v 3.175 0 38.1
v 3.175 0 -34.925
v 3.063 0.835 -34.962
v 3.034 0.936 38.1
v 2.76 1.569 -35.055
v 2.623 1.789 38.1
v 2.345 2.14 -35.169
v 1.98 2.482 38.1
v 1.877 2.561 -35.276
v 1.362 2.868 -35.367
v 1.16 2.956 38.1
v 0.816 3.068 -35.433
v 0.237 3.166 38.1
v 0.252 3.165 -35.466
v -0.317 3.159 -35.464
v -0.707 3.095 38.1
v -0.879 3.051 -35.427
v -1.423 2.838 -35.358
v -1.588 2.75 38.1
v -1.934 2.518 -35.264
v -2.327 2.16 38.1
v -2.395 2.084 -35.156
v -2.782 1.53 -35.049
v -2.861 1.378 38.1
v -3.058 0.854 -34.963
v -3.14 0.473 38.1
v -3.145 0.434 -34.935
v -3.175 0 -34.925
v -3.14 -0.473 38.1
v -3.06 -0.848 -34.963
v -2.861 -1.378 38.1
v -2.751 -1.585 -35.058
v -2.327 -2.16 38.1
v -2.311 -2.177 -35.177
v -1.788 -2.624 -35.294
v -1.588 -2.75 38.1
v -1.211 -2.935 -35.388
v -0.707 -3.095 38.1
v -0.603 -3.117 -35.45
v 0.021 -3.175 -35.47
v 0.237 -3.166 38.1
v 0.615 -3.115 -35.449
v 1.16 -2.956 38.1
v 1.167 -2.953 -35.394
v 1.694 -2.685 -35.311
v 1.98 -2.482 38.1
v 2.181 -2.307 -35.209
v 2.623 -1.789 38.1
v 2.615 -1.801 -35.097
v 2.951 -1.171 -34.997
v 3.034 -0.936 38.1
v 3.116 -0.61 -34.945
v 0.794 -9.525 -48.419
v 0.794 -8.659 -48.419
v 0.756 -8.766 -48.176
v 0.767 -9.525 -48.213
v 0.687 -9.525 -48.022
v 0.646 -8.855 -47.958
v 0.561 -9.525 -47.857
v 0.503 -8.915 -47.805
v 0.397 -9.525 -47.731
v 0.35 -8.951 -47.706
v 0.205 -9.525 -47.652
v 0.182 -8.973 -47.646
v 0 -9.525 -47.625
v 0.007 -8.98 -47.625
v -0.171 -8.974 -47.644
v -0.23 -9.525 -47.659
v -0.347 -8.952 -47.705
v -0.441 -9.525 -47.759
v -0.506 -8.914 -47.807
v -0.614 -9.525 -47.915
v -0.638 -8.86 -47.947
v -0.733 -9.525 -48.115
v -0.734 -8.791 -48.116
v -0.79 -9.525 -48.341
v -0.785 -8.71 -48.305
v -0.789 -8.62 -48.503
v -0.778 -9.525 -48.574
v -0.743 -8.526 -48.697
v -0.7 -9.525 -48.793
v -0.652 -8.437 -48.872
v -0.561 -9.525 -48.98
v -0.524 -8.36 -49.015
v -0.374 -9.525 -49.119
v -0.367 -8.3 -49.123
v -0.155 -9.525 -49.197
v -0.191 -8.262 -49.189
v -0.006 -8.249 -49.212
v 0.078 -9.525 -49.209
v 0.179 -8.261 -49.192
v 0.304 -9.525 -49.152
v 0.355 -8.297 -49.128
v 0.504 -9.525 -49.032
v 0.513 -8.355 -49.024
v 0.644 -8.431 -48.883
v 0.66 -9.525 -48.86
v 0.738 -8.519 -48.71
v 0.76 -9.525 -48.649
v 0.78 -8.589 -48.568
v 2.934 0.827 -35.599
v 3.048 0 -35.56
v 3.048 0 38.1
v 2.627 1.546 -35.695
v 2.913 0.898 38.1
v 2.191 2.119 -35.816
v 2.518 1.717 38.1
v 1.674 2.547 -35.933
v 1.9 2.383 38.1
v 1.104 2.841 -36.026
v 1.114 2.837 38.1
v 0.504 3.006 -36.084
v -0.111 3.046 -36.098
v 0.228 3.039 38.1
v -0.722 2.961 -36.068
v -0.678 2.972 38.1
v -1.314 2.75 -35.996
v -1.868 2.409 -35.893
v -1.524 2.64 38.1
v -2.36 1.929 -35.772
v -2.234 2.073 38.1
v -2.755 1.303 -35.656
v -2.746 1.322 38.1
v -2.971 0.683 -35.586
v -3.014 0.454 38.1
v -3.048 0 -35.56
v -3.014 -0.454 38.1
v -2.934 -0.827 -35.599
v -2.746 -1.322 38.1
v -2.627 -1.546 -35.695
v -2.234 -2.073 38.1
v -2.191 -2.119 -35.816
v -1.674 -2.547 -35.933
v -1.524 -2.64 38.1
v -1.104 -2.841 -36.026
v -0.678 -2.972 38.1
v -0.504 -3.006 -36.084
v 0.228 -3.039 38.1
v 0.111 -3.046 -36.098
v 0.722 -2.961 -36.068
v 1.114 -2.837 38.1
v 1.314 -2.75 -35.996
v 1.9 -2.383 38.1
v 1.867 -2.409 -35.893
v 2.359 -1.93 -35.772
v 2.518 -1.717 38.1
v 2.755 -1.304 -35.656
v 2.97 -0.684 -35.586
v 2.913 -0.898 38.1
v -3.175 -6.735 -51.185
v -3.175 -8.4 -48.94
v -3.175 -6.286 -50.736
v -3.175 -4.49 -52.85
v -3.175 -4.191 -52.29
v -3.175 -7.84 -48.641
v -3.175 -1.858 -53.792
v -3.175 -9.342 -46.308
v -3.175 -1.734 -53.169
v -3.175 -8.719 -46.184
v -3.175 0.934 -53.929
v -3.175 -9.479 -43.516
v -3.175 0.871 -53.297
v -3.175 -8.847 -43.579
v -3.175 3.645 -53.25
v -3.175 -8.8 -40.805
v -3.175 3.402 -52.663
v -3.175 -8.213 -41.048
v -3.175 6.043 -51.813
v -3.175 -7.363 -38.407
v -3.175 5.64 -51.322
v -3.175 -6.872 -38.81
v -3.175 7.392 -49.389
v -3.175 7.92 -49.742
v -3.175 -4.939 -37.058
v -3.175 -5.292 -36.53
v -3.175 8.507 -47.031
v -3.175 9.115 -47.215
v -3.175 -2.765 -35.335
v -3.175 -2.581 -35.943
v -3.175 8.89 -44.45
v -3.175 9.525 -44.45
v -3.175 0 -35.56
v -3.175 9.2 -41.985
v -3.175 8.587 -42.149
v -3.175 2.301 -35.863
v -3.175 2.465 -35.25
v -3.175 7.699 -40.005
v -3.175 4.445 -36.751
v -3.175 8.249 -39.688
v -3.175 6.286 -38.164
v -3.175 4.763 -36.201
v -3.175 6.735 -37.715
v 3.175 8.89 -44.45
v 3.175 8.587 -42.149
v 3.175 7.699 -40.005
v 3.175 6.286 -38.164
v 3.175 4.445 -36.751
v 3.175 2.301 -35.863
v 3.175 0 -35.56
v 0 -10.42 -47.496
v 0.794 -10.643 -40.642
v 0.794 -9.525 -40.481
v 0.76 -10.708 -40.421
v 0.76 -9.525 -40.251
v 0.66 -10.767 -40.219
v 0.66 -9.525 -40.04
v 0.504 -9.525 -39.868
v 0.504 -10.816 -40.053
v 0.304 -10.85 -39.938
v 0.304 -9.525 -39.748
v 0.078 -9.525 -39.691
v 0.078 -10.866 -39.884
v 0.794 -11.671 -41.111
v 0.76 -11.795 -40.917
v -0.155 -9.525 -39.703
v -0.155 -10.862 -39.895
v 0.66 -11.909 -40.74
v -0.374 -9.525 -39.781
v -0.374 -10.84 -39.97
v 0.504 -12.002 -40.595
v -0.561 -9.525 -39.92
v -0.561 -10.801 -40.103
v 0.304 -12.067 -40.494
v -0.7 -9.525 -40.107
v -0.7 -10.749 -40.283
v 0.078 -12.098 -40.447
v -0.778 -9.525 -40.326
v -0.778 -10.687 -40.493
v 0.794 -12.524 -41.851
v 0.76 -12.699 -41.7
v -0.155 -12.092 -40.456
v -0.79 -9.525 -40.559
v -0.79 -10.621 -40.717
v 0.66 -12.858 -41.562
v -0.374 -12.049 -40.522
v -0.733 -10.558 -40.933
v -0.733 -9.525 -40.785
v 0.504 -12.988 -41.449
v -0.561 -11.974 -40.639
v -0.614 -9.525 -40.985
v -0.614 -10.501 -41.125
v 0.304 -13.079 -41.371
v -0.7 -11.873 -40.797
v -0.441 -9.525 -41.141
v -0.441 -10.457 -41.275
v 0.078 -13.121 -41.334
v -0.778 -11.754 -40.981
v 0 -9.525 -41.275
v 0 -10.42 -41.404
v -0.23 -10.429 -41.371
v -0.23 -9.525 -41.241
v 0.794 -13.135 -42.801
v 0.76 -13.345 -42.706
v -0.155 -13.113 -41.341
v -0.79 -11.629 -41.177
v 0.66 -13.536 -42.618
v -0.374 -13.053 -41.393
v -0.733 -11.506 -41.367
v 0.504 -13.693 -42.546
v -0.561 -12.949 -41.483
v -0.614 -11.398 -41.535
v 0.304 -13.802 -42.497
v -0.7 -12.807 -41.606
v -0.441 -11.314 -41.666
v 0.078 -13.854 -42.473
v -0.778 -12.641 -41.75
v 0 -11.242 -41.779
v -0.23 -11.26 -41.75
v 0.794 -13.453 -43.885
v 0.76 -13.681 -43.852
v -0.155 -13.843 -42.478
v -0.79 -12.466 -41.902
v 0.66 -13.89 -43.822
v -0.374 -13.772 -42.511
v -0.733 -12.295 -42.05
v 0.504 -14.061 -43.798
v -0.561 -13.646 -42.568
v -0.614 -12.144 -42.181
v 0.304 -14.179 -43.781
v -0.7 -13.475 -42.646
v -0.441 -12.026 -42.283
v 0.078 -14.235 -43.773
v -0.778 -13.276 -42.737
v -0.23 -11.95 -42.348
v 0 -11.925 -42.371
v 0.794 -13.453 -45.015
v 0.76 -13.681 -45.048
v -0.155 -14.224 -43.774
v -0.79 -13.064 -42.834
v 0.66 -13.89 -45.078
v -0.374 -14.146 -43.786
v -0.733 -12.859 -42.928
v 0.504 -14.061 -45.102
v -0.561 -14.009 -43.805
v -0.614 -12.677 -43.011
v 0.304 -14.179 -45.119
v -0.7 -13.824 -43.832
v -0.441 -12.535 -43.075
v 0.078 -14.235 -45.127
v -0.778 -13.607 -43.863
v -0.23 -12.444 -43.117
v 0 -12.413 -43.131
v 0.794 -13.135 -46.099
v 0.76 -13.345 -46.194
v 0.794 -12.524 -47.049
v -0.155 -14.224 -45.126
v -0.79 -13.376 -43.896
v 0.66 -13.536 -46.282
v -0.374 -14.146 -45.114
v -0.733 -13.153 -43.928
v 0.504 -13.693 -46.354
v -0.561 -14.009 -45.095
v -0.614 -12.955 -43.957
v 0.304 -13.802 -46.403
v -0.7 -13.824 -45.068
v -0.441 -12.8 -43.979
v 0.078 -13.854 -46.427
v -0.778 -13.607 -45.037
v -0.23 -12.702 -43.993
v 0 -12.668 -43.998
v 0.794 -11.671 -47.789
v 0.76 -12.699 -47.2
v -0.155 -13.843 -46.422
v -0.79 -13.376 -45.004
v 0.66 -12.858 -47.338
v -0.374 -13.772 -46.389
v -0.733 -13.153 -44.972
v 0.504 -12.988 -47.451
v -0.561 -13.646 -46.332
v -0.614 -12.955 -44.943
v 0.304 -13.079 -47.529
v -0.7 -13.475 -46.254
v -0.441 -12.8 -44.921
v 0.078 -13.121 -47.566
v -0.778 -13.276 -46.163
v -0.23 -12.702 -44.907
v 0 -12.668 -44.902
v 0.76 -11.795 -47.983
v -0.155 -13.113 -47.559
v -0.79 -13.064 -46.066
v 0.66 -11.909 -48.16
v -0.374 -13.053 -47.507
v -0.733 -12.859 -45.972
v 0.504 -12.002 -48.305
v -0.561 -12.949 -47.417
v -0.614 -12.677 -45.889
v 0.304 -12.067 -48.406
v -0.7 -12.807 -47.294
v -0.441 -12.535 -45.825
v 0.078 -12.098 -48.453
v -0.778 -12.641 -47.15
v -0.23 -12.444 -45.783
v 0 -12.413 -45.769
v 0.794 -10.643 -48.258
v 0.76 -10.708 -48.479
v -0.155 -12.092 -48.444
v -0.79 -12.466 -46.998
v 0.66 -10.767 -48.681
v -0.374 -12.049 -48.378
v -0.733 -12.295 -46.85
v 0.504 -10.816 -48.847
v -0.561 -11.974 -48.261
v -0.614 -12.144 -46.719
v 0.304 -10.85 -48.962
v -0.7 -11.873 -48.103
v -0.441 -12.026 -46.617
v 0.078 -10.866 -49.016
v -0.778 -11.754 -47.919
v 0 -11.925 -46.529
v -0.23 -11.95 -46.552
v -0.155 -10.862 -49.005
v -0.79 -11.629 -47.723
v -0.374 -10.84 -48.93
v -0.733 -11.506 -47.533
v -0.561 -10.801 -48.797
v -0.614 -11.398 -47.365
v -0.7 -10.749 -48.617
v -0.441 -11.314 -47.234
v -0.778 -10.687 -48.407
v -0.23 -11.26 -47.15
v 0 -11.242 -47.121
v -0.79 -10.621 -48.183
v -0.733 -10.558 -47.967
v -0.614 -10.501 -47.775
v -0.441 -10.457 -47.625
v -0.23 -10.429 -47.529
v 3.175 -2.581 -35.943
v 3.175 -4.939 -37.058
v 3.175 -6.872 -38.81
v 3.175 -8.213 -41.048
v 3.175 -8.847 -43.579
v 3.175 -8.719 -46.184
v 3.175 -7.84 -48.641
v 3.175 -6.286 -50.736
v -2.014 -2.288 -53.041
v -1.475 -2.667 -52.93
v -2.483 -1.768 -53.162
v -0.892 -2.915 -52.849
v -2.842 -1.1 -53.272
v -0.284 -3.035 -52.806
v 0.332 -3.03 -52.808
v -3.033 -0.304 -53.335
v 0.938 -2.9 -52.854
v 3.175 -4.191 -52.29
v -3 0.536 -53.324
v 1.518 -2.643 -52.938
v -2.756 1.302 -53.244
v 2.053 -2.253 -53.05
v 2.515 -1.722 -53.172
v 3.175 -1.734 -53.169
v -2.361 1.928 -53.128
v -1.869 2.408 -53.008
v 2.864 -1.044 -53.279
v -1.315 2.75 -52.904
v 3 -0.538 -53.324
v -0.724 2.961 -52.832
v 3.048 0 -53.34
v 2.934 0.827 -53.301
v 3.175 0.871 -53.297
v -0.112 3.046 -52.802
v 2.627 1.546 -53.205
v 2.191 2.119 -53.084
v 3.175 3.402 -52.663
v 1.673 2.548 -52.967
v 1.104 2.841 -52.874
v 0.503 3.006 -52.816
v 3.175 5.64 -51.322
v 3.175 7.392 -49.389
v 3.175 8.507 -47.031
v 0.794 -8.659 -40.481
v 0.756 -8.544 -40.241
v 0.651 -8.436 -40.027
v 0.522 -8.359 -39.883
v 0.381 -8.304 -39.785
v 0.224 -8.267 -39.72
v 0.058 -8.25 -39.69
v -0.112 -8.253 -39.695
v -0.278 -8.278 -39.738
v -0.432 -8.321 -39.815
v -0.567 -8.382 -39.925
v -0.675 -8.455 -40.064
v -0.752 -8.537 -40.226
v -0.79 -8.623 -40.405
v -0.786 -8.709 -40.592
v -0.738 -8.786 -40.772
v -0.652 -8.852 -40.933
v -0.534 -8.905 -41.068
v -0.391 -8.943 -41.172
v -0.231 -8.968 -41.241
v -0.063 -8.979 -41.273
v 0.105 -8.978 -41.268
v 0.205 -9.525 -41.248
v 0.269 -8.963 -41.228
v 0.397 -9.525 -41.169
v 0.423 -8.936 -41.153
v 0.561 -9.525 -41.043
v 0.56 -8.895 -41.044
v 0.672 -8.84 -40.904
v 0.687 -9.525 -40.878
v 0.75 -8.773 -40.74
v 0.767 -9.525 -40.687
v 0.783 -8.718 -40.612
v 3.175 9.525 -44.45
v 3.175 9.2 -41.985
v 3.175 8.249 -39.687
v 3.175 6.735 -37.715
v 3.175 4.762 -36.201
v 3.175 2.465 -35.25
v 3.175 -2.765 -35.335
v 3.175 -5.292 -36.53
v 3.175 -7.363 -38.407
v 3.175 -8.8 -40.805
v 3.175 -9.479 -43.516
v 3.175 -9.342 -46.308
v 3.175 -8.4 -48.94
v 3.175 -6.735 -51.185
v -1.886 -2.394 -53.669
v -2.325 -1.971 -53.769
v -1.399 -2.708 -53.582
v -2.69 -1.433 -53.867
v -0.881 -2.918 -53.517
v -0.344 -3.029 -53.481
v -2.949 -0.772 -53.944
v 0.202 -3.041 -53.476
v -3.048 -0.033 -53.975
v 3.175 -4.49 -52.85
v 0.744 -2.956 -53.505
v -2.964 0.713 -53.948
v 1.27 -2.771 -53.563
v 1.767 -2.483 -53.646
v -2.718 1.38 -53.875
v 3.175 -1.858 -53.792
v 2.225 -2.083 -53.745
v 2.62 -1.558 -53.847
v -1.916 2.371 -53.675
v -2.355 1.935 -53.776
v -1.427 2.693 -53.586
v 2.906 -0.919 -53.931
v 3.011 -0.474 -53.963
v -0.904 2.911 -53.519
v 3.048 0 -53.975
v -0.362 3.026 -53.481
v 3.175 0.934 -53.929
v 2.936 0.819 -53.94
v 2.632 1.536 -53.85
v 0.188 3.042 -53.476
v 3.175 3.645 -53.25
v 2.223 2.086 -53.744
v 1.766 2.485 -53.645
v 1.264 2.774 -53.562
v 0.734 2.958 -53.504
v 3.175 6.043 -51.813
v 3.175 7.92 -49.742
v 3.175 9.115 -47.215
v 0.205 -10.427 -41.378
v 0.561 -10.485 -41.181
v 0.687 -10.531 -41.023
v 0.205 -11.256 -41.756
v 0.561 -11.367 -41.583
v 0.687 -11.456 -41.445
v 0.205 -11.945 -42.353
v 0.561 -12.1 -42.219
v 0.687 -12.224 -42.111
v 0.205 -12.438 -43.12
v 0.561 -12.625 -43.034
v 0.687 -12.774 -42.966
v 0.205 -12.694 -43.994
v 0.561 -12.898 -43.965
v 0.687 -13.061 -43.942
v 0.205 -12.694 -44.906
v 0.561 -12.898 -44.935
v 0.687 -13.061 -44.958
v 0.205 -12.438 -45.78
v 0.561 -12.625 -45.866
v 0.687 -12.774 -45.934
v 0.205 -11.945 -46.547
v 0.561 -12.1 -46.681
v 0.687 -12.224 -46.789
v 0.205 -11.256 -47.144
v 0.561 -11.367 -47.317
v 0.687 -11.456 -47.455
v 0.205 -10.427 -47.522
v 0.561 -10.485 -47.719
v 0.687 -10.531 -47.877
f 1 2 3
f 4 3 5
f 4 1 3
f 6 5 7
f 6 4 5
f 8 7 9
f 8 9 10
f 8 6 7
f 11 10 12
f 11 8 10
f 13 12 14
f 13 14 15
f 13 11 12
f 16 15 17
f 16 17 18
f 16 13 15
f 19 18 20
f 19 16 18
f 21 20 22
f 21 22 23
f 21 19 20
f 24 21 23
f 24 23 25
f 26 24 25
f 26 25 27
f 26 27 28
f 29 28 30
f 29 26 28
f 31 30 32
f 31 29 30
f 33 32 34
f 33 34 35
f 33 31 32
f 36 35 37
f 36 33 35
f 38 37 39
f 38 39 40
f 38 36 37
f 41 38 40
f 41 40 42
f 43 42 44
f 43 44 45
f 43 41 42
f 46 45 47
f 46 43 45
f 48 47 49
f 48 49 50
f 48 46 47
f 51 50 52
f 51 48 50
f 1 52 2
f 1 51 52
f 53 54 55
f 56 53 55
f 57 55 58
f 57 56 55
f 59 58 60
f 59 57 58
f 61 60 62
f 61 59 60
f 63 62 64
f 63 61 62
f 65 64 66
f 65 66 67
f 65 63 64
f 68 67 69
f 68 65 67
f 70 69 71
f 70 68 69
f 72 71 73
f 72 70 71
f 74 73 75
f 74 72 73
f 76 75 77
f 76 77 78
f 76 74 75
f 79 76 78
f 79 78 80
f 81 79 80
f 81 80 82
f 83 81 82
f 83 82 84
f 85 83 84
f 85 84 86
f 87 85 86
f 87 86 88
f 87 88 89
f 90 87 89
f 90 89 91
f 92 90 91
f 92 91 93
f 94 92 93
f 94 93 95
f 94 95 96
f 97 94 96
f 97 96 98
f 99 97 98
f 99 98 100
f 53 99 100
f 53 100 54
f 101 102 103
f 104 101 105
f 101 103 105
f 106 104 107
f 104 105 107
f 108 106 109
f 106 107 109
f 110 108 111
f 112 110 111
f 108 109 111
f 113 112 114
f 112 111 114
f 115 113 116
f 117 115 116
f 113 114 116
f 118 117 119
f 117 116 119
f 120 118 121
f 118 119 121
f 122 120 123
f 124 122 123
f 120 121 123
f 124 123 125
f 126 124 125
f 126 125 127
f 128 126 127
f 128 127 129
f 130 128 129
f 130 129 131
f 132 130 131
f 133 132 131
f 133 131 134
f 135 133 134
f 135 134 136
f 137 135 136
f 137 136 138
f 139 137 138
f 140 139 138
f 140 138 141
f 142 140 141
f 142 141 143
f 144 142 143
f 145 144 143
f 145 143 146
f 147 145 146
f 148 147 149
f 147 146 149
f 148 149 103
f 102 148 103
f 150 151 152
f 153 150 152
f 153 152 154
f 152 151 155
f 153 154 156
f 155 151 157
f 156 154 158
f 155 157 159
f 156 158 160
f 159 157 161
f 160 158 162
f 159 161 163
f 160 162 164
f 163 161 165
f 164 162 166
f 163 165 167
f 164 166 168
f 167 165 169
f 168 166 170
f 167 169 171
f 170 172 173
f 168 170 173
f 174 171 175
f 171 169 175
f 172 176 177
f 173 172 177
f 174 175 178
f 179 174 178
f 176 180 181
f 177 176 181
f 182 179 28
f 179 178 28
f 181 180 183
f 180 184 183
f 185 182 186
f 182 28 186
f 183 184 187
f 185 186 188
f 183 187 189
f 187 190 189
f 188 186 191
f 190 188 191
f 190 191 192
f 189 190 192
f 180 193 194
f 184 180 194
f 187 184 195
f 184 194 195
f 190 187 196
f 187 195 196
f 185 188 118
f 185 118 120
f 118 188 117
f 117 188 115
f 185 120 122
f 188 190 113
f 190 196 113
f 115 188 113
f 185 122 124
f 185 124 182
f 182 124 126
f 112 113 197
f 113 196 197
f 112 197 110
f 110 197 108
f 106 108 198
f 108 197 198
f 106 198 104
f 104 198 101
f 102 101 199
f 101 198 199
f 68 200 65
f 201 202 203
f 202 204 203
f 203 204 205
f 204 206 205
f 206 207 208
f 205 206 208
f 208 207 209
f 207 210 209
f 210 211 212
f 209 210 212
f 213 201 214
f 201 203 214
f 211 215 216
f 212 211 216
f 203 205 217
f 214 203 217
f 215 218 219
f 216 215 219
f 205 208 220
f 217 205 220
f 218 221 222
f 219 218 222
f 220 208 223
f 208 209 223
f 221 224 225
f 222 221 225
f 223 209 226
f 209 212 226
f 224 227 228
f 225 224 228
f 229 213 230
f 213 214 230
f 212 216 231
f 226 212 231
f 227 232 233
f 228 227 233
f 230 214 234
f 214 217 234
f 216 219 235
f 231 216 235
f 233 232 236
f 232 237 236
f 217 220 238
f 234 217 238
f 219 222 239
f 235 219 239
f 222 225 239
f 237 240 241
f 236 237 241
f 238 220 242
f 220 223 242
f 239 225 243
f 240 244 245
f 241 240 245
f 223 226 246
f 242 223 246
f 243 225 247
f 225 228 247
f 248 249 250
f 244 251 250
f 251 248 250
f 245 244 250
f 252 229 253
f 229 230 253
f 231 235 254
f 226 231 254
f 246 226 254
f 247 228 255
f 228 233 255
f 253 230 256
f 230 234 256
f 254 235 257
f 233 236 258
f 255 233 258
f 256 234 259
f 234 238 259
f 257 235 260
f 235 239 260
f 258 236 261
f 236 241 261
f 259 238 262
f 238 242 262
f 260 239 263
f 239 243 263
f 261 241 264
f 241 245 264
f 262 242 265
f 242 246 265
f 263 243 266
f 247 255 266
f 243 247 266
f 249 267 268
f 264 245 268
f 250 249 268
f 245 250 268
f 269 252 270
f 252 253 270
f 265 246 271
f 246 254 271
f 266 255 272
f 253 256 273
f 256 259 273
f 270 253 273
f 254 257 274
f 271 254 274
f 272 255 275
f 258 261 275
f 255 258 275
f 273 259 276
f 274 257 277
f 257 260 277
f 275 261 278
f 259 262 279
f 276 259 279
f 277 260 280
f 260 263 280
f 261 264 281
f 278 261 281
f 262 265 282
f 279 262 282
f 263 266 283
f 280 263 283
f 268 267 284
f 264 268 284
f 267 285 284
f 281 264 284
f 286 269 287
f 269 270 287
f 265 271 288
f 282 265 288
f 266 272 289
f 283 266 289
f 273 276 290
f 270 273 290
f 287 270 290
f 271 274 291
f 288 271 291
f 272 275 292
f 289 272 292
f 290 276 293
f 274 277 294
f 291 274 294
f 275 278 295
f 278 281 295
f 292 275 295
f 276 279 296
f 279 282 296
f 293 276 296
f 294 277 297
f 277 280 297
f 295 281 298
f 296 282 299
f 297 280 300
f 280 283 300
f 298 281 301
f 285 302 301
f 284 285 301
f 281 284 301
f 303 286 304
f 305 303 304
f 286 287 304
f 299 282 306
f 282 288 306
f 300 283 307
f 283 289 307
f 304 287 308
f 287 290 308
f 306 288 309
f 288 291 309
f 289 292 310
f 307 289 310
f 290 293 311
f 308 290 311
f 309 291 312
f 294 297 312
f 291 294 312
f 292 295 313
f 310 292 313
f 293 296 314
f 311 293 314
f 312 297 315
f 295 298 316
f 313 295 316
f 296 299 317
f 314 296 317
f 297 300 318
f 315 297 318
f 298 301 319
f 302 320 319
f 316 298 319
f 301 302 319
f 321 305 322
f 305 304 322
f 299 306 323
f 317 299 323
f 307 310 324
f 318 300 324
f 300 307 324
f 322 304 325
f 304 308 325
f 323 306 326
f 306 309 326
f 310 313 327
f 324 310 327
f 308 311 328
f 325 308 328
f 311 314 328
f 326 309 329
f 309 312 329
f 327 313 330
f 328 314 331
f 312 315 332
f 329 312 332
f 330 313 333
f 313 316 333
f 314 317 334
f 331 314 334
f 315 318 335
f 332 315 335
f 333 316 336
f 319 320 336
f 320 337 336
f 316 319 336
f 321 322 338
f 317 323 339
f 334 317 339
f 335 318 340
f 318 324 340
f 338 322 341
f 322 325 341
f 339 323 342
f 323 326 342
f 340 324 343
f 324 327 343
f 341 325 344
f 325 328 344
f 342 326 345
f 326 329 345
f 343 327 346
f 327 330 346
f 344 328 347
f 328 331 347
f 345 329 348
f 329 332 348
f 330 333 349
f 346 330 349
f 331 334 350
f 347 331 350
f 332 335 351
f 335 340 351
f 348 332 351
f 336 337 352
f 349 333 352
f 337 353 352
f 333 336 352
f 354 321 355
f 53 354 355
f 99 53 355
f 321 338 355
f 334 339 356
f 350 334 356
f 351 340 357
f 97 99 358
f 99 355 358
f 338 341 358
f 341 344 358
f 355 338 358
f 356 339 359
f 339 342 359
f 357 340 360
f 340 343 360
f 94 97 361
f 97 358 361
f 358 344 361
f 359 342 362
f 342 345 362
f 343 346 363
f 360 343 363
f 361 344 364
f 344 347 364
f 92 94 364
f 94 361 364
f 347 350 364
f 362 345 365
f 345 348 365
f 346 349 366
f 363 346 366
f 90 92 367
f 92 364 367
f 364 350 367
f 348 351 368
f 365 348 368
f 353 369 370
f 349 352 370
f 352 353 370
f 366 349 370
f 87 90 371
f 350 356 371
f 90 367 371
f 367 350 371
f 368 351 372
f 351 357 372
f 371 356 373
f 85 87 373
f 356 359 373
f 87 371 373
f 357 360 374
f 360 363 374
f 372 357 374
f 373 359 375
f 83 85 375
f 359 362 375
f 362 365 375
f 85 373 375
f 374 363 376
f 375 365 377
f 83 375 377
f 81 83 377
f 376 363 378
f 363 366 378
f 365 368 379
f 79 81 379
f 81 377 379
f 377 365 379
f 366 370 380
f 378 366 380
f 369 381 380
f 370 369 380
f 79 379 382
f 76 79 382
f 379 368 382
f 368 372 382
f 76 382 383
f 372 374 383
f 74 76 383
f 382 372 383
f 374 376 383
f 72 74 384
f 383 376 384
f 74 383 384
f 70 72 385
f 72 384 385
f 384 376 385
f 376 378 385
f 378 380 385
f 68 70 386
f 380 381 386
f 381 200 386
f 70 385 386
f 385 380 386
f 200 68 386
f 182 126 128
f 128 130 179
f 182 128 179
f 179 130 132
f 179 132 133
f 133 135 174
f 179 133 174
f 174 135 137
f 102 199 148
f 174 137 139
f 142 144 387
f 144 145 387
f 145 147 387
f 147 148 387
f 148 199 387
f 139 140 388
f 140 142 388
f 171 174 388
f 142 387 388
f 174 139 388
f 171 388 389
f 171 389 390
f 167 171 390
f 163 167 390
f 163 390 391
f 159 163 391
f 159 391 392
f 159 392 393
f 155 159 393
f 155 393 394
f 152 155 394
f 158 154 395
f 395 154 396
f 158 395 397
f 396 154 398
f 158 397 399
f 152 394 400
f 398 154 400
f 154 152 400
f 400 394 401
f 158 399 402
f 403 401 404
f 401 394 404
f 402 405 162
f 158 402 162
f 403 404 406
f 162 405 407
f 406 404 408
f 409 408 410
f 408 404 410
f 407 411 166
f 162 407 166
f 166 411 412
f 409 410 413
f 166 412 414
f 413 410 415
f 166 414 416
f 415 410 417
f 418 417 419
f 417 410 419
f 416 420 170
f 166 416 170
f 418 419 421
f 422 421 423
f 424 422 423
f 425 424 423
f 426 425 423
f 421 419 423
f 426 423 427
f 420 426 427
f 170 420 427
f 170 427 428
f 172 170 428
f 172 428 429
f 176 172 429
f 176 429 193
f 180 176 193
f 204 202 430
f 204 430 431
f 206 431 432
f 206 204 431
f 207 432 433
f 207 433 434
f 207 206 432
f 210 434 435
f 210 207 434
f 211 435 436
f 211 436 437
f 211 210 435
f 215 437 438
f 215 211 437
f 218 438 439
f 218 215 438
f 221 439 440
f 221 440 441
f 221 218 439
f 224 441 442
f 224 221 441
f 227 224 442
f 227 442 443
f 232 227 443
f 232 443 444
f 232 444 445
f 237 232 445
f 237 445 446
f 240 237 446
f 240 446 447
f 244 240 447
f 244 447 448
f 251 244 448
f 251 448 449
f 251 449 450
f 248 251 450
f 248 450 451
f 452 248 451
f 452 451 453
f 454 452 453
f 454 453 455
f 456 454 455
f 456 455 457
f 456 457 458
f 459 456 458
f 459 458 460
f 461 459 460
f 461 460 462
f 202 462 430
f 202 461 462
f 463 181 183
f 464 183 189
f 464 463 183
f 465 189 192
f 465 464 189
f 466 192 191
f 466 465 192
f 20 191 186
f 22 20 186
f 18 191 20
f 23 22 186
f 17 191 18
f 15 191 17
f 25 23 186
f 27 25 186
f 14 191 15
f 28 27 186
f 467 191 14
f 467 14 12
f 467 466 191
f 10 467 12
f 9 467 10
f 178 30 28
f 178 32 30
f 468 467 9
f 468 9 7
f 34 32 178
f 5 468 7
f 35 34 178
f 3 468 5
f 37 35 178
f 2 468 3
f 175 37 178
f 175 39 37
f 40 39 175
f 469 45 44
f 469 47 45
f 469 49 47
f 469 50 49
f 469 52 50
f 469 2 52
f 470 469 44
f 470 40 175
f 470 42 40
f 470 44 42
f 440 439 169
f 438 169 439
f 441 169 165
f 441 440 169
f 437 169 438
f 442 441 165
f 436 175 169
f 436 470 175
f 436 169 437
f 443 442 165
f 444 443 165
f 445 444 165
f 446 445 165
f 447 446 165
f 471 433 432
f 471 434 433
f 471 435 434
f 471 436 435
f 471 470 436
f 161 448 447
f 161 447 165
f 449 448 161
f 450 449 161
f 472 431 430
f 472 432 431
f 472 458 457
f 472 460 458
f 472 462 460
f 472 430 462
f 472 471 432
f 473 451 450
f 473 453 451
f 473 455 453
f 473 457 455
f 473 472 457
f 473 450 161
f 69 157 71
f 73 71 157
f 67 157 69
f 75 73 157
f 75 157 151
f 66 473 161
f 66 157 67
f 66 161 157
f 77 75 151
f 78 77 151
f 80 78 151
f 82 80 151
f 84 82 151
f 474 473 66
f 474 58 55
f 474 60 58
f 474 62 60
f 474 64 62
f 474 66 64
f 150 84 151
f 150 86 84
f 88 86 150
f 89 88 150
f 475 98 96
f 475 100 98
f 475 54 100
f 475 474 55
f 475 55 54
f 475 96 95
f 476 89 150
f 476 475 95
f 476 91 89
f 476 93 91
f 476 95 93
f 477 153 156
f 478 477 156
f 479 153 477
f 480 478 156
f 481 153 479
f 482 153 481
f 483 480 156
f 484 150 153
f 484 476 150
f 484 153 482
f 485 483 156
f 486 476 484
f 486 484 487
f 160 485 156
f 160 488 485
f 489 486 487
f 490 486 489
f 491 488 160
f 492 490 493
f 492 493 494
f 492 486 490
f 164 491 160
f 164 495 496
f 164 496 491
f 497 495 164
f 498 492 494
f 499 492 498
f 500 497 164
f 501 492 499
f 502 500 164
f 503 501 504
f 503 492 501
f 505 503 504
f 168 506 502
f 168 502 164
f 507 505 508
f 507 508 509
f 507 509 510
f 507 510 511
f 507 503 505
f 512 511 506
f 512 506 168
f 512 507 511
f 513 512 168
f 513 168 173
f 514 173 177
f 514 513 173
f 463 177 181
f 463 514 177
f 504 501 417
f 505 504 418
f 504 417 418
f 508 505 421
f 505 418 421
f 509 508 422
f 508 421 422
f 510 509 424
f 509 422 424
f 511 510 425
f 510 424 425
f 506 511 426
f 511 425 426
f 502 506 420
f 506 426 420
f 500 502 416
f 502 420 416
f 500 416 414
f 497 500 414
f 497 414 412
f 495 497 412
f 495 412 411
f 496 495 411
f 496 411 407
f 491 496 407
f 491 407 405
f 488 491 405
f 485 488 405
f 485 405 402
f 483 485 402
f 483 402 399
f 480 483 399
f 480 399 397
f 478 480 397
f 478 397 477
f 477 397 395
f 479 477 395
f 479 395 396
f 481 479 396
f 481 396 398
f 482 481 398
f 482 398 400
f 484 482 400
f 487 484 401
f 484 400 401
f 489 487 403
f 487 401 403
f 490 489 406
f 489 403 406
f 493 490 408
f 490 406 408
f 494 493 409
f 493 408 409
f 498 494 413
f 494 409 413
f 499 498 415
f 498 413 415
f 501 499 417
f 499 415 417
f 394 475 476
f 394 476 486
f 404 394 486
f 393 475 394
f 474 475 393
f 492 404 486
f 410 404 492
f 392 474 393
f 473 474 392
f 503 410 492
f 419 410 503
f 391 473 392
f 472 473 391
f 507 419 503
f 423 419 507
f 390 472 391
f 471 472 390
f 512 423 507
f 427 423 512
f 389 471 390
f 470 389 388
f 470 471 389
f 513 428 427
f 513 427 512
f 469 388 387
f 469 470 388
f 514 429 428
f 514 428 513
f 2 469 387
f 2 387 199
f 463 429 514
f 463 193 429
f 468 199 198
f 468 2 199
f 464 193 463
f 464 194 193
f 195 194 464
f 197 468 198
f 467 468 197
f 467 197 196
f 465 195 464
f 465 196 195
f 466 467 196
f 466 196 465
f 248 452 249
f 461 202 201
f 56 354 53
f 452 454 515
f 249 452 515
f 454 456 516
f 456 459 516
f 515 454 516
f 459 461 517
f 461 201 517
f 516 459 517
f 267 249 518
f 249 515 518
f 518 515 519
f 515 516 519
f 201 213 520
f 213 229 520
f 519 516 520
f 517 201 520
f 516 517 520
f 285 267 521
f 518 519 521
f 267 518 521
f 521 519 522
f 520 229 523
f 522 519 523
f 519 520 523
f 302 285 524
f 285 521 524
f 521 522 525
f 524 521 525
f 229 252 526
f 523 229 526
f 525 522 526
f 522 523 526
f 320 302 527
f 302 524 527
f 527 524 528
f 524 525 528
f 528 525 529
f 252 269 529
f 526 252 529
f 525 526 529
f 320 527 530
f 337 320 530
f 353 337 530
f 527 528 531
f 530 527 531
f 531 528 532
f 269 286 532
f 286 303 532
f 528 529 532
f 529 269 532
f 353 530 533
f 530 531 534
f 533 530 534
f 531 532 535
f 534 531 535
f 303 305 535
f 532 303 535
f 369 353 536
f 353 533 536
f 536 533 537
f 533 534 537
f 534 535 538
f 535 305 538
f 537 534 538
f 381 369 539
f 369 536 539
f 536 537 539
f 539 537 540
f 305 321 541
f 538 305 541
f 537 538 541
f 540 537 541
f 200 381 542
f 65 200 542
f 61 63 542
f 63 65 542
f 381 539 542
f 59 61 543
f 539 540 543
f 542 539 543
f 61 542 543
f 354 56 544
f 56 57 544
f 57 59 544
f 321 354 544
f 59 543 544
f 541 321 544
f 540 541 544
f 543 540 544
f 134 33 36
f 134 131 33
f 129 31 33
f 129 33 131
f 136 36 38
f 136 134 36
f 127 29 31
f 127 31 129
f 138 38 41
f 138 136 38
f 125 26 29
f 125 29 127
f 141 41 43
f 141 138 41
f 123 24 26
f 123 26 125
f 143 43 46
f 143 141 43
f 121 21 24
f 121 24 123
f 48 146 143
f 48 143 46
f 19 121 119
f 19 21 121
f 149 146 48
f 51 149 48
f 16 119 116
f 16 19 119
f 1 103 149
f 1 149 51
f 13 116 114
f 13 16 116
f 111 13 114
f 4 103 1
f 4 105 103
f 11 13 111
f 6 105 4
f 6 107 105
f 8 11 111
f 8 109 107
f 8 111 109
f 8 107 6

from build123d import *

# Parameters (mm, degrees)
F0_R      = 3.175
F1_DEPTH  = 38.1
F3_R      = 9.525
F4_DEPTH  = 3.175
F5_R      = 3.048
F6_DEPTH  = 92.0760001
F8_DEPTH  = 6.3510001273
F12_R     = 0.79375
F15_ANGLE = 180


with BuildPart() as f1:
    # F0 (on Top) → F1 (new body, symmetric)
    with BuildSketch(Plane.XY):
        Circle(F0_R)
    extrude(amount=F1_DEPTH, both=True)

    # F3 (on Right) → F4 (join, symmetric)
    with BuildSketch(Plane.YZ):
        with Locations((0, -44.45)):
            Circle(F3_R)
    extrude(amount=F4_DEPTH, both=True)

    # F5 (on face) → F6 (cut, through all)
    with BuildSketch(Plane.XY.offset(38.1)):
        Circle(F5_R)
    extrude(amount=-F6_DEPTH, mode=Mode.SUBTRACT)

    # F7 (on face) → F8 (cut, through all)
    with BuildSketch(Plane.YZ.offset(3.175)):
        with BuildLine():
            ThreePointArc((0, -35.56), (-6.2861792847, -50.7361792847), (8.89, -44.45))
            ThreePointArc((8.89, -44.45), (6.2861792847, -38.1638207153), (0, -35.56))
        make_face()
    extrude(amount=-F8_DEPTH, mode=Mode.SUBTRACT)

    # F12 (on offset) → F13 (join, up to the next surface of F1)
    with BuildSketch(Plane.XZ.offset(9.525)):
        with Locations((0, -40.48125)):
            Circle(F12_R)
        with Locations((0, -48.41875)):
            Circle(F12_R)
    extrude(until=Until.NEXT, dir=(0, 1, 0))

    # F14 (on face) → F15 (revolve)
    with BuildSketch(Plane.XZ.offset(9.525)):
        with BuildLine():
            ThreePointArc((0, -41.275), (0.5612660076, -41.0425160076), (0.79375, -40.48125))
            ThreePointArc((0.79375, -40.48125), (-0.5612660076, -39.9199839924), (0, -41.275))
        make_face()
    revolve(axis=Axis((2.719247248, -9.525, -44.45), (1, 0, 0)), revolution_arc=F15_ANGLE)


solid = f1.part
